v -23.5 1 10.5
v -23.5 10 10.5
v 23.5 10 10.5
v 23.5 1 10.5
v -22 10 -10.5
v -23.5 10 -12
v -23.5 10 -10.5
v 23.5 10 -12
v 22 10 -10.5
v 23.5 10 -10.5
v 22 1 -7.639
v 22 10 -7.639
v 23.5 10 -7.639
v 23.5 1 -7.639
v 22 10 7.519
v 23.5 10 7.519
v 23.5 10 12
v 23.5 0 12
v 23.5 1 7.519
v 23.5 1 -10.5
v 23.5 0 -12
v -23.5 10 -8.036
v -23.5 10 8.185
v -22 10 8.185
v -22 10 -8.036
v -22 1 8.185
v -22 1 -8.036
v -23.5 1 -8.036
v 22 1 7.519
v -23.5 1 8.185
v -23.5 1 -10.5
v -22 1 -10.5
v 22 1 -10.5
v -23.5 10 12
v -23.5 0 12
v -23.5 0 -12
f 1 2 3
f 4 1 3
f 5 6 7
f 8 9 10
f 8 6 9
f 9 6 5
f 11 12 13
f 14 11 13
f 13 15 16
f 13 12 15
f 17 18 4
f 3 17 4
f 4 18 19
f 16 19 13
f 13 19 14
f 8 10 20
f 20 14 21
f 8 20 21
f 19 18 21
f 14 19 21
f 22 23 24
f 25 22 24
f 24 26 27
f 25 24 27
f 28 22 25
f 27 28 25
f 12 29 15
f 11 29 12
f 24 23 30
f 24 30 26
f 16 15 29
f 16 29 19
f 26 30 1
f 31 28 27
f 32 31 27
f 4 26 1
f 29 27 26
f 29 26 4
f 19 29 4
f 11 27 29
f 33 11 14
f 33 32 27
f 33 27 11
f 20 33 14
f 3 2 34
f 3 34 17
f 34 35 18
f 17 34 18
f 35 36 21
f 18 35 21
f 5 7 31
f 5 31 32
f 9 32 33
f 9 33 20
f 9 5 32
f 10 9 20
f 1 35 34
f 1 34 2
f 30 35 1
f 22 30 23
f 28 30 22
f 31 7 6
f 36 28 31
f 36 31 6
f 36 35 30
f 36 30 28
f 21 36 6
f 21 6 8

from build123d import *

# Parameters (mm, degrees)
SKETCH1_W           = 47
SKETCH1_H           = 24
SKETCH1_W_2         = 44
SKETCH1_H_2         = 21
BOSS_EXTRUDE1_DEPTH = 1
SKETCH1_3_W         = 47
SKETCH1_3_H         = 24
SKETCH1_3_W_2       = 44
SKETCH1_3_H_2       = 21
BOSS_EXTRUDE2_DEPTH = 10
SKETCH2_W           = 1.5
SKETCH2_H           = 2.861016429
SKETCH2_H_2         = 2.980642968
SKETCH2_H_3         = 2.463825615
SKETCH2_H_4         = 2.315157892
CUT_EXTRUDE1_DEPTH  = 9


with BuildPart() as part:
    # Sketch1 → Boss-Extrude1 (new body)
    with BuildSketch(Plane(origin=(0, 0, 0), x_dir=(1, 0, 0), z_dir=(0, 1, 0))):
        Rectangle(SKETCH1_W, SKETCH1_H)
        Rectangle(SKETCH1_W_2, SKETCH1_H_2, mode=Mode.SUBTRACT)
        Rectangle(SKETCH1_W_2, SKETCH1_H_2)
    extrude(amount=BOSS_EXTRUDE1_DEPTH)

    # Sketch1<3> → Boss-Extrude2 (add)
    with BuildSketch(Plane(origin=(0, 0, 0), x_dir=(1, 0, 0), z_dir=(0, 1, 0))):
        Rectangle(SKETCH1_3_W, SKETCH1_3_H)
        Rectangle(SKETCH1_3_W_2, SKETCH1_3_H_2, mode=Mode.SUBTRACT)
    extrude(amount=BOSS_EXTRUDE2_DEPTH)

    # Sketch2 → Cut-Extrude1 (cut)
    with BuildSketch(Plane(origin=(0, 10, 0), x_dir=(1, 0, 0), z_dir=(0, 1, 0))):
        with Locations((22.75, 9.069491786)):
            Rectangle(SKETCH2_W, SKETCH2_H)
        with Locations((22.75, -9.009678516)):
            Rectangle(SKETCH2_W, SKETCH2_H_2)
        with Locations((-22.75, 9.268087193)):
            Rectangle(SKETCH2_W, SKETCH2_H_3)
        with Locations((-22.75, -9.342421054)):
            Rectangle(SKETCH2_W, SKETCH2_H_4)
    extrude(amount=-CUT_EXTRUDE1_DEPTH, mode=Mode.SUBTRACT)


solid = part.part
